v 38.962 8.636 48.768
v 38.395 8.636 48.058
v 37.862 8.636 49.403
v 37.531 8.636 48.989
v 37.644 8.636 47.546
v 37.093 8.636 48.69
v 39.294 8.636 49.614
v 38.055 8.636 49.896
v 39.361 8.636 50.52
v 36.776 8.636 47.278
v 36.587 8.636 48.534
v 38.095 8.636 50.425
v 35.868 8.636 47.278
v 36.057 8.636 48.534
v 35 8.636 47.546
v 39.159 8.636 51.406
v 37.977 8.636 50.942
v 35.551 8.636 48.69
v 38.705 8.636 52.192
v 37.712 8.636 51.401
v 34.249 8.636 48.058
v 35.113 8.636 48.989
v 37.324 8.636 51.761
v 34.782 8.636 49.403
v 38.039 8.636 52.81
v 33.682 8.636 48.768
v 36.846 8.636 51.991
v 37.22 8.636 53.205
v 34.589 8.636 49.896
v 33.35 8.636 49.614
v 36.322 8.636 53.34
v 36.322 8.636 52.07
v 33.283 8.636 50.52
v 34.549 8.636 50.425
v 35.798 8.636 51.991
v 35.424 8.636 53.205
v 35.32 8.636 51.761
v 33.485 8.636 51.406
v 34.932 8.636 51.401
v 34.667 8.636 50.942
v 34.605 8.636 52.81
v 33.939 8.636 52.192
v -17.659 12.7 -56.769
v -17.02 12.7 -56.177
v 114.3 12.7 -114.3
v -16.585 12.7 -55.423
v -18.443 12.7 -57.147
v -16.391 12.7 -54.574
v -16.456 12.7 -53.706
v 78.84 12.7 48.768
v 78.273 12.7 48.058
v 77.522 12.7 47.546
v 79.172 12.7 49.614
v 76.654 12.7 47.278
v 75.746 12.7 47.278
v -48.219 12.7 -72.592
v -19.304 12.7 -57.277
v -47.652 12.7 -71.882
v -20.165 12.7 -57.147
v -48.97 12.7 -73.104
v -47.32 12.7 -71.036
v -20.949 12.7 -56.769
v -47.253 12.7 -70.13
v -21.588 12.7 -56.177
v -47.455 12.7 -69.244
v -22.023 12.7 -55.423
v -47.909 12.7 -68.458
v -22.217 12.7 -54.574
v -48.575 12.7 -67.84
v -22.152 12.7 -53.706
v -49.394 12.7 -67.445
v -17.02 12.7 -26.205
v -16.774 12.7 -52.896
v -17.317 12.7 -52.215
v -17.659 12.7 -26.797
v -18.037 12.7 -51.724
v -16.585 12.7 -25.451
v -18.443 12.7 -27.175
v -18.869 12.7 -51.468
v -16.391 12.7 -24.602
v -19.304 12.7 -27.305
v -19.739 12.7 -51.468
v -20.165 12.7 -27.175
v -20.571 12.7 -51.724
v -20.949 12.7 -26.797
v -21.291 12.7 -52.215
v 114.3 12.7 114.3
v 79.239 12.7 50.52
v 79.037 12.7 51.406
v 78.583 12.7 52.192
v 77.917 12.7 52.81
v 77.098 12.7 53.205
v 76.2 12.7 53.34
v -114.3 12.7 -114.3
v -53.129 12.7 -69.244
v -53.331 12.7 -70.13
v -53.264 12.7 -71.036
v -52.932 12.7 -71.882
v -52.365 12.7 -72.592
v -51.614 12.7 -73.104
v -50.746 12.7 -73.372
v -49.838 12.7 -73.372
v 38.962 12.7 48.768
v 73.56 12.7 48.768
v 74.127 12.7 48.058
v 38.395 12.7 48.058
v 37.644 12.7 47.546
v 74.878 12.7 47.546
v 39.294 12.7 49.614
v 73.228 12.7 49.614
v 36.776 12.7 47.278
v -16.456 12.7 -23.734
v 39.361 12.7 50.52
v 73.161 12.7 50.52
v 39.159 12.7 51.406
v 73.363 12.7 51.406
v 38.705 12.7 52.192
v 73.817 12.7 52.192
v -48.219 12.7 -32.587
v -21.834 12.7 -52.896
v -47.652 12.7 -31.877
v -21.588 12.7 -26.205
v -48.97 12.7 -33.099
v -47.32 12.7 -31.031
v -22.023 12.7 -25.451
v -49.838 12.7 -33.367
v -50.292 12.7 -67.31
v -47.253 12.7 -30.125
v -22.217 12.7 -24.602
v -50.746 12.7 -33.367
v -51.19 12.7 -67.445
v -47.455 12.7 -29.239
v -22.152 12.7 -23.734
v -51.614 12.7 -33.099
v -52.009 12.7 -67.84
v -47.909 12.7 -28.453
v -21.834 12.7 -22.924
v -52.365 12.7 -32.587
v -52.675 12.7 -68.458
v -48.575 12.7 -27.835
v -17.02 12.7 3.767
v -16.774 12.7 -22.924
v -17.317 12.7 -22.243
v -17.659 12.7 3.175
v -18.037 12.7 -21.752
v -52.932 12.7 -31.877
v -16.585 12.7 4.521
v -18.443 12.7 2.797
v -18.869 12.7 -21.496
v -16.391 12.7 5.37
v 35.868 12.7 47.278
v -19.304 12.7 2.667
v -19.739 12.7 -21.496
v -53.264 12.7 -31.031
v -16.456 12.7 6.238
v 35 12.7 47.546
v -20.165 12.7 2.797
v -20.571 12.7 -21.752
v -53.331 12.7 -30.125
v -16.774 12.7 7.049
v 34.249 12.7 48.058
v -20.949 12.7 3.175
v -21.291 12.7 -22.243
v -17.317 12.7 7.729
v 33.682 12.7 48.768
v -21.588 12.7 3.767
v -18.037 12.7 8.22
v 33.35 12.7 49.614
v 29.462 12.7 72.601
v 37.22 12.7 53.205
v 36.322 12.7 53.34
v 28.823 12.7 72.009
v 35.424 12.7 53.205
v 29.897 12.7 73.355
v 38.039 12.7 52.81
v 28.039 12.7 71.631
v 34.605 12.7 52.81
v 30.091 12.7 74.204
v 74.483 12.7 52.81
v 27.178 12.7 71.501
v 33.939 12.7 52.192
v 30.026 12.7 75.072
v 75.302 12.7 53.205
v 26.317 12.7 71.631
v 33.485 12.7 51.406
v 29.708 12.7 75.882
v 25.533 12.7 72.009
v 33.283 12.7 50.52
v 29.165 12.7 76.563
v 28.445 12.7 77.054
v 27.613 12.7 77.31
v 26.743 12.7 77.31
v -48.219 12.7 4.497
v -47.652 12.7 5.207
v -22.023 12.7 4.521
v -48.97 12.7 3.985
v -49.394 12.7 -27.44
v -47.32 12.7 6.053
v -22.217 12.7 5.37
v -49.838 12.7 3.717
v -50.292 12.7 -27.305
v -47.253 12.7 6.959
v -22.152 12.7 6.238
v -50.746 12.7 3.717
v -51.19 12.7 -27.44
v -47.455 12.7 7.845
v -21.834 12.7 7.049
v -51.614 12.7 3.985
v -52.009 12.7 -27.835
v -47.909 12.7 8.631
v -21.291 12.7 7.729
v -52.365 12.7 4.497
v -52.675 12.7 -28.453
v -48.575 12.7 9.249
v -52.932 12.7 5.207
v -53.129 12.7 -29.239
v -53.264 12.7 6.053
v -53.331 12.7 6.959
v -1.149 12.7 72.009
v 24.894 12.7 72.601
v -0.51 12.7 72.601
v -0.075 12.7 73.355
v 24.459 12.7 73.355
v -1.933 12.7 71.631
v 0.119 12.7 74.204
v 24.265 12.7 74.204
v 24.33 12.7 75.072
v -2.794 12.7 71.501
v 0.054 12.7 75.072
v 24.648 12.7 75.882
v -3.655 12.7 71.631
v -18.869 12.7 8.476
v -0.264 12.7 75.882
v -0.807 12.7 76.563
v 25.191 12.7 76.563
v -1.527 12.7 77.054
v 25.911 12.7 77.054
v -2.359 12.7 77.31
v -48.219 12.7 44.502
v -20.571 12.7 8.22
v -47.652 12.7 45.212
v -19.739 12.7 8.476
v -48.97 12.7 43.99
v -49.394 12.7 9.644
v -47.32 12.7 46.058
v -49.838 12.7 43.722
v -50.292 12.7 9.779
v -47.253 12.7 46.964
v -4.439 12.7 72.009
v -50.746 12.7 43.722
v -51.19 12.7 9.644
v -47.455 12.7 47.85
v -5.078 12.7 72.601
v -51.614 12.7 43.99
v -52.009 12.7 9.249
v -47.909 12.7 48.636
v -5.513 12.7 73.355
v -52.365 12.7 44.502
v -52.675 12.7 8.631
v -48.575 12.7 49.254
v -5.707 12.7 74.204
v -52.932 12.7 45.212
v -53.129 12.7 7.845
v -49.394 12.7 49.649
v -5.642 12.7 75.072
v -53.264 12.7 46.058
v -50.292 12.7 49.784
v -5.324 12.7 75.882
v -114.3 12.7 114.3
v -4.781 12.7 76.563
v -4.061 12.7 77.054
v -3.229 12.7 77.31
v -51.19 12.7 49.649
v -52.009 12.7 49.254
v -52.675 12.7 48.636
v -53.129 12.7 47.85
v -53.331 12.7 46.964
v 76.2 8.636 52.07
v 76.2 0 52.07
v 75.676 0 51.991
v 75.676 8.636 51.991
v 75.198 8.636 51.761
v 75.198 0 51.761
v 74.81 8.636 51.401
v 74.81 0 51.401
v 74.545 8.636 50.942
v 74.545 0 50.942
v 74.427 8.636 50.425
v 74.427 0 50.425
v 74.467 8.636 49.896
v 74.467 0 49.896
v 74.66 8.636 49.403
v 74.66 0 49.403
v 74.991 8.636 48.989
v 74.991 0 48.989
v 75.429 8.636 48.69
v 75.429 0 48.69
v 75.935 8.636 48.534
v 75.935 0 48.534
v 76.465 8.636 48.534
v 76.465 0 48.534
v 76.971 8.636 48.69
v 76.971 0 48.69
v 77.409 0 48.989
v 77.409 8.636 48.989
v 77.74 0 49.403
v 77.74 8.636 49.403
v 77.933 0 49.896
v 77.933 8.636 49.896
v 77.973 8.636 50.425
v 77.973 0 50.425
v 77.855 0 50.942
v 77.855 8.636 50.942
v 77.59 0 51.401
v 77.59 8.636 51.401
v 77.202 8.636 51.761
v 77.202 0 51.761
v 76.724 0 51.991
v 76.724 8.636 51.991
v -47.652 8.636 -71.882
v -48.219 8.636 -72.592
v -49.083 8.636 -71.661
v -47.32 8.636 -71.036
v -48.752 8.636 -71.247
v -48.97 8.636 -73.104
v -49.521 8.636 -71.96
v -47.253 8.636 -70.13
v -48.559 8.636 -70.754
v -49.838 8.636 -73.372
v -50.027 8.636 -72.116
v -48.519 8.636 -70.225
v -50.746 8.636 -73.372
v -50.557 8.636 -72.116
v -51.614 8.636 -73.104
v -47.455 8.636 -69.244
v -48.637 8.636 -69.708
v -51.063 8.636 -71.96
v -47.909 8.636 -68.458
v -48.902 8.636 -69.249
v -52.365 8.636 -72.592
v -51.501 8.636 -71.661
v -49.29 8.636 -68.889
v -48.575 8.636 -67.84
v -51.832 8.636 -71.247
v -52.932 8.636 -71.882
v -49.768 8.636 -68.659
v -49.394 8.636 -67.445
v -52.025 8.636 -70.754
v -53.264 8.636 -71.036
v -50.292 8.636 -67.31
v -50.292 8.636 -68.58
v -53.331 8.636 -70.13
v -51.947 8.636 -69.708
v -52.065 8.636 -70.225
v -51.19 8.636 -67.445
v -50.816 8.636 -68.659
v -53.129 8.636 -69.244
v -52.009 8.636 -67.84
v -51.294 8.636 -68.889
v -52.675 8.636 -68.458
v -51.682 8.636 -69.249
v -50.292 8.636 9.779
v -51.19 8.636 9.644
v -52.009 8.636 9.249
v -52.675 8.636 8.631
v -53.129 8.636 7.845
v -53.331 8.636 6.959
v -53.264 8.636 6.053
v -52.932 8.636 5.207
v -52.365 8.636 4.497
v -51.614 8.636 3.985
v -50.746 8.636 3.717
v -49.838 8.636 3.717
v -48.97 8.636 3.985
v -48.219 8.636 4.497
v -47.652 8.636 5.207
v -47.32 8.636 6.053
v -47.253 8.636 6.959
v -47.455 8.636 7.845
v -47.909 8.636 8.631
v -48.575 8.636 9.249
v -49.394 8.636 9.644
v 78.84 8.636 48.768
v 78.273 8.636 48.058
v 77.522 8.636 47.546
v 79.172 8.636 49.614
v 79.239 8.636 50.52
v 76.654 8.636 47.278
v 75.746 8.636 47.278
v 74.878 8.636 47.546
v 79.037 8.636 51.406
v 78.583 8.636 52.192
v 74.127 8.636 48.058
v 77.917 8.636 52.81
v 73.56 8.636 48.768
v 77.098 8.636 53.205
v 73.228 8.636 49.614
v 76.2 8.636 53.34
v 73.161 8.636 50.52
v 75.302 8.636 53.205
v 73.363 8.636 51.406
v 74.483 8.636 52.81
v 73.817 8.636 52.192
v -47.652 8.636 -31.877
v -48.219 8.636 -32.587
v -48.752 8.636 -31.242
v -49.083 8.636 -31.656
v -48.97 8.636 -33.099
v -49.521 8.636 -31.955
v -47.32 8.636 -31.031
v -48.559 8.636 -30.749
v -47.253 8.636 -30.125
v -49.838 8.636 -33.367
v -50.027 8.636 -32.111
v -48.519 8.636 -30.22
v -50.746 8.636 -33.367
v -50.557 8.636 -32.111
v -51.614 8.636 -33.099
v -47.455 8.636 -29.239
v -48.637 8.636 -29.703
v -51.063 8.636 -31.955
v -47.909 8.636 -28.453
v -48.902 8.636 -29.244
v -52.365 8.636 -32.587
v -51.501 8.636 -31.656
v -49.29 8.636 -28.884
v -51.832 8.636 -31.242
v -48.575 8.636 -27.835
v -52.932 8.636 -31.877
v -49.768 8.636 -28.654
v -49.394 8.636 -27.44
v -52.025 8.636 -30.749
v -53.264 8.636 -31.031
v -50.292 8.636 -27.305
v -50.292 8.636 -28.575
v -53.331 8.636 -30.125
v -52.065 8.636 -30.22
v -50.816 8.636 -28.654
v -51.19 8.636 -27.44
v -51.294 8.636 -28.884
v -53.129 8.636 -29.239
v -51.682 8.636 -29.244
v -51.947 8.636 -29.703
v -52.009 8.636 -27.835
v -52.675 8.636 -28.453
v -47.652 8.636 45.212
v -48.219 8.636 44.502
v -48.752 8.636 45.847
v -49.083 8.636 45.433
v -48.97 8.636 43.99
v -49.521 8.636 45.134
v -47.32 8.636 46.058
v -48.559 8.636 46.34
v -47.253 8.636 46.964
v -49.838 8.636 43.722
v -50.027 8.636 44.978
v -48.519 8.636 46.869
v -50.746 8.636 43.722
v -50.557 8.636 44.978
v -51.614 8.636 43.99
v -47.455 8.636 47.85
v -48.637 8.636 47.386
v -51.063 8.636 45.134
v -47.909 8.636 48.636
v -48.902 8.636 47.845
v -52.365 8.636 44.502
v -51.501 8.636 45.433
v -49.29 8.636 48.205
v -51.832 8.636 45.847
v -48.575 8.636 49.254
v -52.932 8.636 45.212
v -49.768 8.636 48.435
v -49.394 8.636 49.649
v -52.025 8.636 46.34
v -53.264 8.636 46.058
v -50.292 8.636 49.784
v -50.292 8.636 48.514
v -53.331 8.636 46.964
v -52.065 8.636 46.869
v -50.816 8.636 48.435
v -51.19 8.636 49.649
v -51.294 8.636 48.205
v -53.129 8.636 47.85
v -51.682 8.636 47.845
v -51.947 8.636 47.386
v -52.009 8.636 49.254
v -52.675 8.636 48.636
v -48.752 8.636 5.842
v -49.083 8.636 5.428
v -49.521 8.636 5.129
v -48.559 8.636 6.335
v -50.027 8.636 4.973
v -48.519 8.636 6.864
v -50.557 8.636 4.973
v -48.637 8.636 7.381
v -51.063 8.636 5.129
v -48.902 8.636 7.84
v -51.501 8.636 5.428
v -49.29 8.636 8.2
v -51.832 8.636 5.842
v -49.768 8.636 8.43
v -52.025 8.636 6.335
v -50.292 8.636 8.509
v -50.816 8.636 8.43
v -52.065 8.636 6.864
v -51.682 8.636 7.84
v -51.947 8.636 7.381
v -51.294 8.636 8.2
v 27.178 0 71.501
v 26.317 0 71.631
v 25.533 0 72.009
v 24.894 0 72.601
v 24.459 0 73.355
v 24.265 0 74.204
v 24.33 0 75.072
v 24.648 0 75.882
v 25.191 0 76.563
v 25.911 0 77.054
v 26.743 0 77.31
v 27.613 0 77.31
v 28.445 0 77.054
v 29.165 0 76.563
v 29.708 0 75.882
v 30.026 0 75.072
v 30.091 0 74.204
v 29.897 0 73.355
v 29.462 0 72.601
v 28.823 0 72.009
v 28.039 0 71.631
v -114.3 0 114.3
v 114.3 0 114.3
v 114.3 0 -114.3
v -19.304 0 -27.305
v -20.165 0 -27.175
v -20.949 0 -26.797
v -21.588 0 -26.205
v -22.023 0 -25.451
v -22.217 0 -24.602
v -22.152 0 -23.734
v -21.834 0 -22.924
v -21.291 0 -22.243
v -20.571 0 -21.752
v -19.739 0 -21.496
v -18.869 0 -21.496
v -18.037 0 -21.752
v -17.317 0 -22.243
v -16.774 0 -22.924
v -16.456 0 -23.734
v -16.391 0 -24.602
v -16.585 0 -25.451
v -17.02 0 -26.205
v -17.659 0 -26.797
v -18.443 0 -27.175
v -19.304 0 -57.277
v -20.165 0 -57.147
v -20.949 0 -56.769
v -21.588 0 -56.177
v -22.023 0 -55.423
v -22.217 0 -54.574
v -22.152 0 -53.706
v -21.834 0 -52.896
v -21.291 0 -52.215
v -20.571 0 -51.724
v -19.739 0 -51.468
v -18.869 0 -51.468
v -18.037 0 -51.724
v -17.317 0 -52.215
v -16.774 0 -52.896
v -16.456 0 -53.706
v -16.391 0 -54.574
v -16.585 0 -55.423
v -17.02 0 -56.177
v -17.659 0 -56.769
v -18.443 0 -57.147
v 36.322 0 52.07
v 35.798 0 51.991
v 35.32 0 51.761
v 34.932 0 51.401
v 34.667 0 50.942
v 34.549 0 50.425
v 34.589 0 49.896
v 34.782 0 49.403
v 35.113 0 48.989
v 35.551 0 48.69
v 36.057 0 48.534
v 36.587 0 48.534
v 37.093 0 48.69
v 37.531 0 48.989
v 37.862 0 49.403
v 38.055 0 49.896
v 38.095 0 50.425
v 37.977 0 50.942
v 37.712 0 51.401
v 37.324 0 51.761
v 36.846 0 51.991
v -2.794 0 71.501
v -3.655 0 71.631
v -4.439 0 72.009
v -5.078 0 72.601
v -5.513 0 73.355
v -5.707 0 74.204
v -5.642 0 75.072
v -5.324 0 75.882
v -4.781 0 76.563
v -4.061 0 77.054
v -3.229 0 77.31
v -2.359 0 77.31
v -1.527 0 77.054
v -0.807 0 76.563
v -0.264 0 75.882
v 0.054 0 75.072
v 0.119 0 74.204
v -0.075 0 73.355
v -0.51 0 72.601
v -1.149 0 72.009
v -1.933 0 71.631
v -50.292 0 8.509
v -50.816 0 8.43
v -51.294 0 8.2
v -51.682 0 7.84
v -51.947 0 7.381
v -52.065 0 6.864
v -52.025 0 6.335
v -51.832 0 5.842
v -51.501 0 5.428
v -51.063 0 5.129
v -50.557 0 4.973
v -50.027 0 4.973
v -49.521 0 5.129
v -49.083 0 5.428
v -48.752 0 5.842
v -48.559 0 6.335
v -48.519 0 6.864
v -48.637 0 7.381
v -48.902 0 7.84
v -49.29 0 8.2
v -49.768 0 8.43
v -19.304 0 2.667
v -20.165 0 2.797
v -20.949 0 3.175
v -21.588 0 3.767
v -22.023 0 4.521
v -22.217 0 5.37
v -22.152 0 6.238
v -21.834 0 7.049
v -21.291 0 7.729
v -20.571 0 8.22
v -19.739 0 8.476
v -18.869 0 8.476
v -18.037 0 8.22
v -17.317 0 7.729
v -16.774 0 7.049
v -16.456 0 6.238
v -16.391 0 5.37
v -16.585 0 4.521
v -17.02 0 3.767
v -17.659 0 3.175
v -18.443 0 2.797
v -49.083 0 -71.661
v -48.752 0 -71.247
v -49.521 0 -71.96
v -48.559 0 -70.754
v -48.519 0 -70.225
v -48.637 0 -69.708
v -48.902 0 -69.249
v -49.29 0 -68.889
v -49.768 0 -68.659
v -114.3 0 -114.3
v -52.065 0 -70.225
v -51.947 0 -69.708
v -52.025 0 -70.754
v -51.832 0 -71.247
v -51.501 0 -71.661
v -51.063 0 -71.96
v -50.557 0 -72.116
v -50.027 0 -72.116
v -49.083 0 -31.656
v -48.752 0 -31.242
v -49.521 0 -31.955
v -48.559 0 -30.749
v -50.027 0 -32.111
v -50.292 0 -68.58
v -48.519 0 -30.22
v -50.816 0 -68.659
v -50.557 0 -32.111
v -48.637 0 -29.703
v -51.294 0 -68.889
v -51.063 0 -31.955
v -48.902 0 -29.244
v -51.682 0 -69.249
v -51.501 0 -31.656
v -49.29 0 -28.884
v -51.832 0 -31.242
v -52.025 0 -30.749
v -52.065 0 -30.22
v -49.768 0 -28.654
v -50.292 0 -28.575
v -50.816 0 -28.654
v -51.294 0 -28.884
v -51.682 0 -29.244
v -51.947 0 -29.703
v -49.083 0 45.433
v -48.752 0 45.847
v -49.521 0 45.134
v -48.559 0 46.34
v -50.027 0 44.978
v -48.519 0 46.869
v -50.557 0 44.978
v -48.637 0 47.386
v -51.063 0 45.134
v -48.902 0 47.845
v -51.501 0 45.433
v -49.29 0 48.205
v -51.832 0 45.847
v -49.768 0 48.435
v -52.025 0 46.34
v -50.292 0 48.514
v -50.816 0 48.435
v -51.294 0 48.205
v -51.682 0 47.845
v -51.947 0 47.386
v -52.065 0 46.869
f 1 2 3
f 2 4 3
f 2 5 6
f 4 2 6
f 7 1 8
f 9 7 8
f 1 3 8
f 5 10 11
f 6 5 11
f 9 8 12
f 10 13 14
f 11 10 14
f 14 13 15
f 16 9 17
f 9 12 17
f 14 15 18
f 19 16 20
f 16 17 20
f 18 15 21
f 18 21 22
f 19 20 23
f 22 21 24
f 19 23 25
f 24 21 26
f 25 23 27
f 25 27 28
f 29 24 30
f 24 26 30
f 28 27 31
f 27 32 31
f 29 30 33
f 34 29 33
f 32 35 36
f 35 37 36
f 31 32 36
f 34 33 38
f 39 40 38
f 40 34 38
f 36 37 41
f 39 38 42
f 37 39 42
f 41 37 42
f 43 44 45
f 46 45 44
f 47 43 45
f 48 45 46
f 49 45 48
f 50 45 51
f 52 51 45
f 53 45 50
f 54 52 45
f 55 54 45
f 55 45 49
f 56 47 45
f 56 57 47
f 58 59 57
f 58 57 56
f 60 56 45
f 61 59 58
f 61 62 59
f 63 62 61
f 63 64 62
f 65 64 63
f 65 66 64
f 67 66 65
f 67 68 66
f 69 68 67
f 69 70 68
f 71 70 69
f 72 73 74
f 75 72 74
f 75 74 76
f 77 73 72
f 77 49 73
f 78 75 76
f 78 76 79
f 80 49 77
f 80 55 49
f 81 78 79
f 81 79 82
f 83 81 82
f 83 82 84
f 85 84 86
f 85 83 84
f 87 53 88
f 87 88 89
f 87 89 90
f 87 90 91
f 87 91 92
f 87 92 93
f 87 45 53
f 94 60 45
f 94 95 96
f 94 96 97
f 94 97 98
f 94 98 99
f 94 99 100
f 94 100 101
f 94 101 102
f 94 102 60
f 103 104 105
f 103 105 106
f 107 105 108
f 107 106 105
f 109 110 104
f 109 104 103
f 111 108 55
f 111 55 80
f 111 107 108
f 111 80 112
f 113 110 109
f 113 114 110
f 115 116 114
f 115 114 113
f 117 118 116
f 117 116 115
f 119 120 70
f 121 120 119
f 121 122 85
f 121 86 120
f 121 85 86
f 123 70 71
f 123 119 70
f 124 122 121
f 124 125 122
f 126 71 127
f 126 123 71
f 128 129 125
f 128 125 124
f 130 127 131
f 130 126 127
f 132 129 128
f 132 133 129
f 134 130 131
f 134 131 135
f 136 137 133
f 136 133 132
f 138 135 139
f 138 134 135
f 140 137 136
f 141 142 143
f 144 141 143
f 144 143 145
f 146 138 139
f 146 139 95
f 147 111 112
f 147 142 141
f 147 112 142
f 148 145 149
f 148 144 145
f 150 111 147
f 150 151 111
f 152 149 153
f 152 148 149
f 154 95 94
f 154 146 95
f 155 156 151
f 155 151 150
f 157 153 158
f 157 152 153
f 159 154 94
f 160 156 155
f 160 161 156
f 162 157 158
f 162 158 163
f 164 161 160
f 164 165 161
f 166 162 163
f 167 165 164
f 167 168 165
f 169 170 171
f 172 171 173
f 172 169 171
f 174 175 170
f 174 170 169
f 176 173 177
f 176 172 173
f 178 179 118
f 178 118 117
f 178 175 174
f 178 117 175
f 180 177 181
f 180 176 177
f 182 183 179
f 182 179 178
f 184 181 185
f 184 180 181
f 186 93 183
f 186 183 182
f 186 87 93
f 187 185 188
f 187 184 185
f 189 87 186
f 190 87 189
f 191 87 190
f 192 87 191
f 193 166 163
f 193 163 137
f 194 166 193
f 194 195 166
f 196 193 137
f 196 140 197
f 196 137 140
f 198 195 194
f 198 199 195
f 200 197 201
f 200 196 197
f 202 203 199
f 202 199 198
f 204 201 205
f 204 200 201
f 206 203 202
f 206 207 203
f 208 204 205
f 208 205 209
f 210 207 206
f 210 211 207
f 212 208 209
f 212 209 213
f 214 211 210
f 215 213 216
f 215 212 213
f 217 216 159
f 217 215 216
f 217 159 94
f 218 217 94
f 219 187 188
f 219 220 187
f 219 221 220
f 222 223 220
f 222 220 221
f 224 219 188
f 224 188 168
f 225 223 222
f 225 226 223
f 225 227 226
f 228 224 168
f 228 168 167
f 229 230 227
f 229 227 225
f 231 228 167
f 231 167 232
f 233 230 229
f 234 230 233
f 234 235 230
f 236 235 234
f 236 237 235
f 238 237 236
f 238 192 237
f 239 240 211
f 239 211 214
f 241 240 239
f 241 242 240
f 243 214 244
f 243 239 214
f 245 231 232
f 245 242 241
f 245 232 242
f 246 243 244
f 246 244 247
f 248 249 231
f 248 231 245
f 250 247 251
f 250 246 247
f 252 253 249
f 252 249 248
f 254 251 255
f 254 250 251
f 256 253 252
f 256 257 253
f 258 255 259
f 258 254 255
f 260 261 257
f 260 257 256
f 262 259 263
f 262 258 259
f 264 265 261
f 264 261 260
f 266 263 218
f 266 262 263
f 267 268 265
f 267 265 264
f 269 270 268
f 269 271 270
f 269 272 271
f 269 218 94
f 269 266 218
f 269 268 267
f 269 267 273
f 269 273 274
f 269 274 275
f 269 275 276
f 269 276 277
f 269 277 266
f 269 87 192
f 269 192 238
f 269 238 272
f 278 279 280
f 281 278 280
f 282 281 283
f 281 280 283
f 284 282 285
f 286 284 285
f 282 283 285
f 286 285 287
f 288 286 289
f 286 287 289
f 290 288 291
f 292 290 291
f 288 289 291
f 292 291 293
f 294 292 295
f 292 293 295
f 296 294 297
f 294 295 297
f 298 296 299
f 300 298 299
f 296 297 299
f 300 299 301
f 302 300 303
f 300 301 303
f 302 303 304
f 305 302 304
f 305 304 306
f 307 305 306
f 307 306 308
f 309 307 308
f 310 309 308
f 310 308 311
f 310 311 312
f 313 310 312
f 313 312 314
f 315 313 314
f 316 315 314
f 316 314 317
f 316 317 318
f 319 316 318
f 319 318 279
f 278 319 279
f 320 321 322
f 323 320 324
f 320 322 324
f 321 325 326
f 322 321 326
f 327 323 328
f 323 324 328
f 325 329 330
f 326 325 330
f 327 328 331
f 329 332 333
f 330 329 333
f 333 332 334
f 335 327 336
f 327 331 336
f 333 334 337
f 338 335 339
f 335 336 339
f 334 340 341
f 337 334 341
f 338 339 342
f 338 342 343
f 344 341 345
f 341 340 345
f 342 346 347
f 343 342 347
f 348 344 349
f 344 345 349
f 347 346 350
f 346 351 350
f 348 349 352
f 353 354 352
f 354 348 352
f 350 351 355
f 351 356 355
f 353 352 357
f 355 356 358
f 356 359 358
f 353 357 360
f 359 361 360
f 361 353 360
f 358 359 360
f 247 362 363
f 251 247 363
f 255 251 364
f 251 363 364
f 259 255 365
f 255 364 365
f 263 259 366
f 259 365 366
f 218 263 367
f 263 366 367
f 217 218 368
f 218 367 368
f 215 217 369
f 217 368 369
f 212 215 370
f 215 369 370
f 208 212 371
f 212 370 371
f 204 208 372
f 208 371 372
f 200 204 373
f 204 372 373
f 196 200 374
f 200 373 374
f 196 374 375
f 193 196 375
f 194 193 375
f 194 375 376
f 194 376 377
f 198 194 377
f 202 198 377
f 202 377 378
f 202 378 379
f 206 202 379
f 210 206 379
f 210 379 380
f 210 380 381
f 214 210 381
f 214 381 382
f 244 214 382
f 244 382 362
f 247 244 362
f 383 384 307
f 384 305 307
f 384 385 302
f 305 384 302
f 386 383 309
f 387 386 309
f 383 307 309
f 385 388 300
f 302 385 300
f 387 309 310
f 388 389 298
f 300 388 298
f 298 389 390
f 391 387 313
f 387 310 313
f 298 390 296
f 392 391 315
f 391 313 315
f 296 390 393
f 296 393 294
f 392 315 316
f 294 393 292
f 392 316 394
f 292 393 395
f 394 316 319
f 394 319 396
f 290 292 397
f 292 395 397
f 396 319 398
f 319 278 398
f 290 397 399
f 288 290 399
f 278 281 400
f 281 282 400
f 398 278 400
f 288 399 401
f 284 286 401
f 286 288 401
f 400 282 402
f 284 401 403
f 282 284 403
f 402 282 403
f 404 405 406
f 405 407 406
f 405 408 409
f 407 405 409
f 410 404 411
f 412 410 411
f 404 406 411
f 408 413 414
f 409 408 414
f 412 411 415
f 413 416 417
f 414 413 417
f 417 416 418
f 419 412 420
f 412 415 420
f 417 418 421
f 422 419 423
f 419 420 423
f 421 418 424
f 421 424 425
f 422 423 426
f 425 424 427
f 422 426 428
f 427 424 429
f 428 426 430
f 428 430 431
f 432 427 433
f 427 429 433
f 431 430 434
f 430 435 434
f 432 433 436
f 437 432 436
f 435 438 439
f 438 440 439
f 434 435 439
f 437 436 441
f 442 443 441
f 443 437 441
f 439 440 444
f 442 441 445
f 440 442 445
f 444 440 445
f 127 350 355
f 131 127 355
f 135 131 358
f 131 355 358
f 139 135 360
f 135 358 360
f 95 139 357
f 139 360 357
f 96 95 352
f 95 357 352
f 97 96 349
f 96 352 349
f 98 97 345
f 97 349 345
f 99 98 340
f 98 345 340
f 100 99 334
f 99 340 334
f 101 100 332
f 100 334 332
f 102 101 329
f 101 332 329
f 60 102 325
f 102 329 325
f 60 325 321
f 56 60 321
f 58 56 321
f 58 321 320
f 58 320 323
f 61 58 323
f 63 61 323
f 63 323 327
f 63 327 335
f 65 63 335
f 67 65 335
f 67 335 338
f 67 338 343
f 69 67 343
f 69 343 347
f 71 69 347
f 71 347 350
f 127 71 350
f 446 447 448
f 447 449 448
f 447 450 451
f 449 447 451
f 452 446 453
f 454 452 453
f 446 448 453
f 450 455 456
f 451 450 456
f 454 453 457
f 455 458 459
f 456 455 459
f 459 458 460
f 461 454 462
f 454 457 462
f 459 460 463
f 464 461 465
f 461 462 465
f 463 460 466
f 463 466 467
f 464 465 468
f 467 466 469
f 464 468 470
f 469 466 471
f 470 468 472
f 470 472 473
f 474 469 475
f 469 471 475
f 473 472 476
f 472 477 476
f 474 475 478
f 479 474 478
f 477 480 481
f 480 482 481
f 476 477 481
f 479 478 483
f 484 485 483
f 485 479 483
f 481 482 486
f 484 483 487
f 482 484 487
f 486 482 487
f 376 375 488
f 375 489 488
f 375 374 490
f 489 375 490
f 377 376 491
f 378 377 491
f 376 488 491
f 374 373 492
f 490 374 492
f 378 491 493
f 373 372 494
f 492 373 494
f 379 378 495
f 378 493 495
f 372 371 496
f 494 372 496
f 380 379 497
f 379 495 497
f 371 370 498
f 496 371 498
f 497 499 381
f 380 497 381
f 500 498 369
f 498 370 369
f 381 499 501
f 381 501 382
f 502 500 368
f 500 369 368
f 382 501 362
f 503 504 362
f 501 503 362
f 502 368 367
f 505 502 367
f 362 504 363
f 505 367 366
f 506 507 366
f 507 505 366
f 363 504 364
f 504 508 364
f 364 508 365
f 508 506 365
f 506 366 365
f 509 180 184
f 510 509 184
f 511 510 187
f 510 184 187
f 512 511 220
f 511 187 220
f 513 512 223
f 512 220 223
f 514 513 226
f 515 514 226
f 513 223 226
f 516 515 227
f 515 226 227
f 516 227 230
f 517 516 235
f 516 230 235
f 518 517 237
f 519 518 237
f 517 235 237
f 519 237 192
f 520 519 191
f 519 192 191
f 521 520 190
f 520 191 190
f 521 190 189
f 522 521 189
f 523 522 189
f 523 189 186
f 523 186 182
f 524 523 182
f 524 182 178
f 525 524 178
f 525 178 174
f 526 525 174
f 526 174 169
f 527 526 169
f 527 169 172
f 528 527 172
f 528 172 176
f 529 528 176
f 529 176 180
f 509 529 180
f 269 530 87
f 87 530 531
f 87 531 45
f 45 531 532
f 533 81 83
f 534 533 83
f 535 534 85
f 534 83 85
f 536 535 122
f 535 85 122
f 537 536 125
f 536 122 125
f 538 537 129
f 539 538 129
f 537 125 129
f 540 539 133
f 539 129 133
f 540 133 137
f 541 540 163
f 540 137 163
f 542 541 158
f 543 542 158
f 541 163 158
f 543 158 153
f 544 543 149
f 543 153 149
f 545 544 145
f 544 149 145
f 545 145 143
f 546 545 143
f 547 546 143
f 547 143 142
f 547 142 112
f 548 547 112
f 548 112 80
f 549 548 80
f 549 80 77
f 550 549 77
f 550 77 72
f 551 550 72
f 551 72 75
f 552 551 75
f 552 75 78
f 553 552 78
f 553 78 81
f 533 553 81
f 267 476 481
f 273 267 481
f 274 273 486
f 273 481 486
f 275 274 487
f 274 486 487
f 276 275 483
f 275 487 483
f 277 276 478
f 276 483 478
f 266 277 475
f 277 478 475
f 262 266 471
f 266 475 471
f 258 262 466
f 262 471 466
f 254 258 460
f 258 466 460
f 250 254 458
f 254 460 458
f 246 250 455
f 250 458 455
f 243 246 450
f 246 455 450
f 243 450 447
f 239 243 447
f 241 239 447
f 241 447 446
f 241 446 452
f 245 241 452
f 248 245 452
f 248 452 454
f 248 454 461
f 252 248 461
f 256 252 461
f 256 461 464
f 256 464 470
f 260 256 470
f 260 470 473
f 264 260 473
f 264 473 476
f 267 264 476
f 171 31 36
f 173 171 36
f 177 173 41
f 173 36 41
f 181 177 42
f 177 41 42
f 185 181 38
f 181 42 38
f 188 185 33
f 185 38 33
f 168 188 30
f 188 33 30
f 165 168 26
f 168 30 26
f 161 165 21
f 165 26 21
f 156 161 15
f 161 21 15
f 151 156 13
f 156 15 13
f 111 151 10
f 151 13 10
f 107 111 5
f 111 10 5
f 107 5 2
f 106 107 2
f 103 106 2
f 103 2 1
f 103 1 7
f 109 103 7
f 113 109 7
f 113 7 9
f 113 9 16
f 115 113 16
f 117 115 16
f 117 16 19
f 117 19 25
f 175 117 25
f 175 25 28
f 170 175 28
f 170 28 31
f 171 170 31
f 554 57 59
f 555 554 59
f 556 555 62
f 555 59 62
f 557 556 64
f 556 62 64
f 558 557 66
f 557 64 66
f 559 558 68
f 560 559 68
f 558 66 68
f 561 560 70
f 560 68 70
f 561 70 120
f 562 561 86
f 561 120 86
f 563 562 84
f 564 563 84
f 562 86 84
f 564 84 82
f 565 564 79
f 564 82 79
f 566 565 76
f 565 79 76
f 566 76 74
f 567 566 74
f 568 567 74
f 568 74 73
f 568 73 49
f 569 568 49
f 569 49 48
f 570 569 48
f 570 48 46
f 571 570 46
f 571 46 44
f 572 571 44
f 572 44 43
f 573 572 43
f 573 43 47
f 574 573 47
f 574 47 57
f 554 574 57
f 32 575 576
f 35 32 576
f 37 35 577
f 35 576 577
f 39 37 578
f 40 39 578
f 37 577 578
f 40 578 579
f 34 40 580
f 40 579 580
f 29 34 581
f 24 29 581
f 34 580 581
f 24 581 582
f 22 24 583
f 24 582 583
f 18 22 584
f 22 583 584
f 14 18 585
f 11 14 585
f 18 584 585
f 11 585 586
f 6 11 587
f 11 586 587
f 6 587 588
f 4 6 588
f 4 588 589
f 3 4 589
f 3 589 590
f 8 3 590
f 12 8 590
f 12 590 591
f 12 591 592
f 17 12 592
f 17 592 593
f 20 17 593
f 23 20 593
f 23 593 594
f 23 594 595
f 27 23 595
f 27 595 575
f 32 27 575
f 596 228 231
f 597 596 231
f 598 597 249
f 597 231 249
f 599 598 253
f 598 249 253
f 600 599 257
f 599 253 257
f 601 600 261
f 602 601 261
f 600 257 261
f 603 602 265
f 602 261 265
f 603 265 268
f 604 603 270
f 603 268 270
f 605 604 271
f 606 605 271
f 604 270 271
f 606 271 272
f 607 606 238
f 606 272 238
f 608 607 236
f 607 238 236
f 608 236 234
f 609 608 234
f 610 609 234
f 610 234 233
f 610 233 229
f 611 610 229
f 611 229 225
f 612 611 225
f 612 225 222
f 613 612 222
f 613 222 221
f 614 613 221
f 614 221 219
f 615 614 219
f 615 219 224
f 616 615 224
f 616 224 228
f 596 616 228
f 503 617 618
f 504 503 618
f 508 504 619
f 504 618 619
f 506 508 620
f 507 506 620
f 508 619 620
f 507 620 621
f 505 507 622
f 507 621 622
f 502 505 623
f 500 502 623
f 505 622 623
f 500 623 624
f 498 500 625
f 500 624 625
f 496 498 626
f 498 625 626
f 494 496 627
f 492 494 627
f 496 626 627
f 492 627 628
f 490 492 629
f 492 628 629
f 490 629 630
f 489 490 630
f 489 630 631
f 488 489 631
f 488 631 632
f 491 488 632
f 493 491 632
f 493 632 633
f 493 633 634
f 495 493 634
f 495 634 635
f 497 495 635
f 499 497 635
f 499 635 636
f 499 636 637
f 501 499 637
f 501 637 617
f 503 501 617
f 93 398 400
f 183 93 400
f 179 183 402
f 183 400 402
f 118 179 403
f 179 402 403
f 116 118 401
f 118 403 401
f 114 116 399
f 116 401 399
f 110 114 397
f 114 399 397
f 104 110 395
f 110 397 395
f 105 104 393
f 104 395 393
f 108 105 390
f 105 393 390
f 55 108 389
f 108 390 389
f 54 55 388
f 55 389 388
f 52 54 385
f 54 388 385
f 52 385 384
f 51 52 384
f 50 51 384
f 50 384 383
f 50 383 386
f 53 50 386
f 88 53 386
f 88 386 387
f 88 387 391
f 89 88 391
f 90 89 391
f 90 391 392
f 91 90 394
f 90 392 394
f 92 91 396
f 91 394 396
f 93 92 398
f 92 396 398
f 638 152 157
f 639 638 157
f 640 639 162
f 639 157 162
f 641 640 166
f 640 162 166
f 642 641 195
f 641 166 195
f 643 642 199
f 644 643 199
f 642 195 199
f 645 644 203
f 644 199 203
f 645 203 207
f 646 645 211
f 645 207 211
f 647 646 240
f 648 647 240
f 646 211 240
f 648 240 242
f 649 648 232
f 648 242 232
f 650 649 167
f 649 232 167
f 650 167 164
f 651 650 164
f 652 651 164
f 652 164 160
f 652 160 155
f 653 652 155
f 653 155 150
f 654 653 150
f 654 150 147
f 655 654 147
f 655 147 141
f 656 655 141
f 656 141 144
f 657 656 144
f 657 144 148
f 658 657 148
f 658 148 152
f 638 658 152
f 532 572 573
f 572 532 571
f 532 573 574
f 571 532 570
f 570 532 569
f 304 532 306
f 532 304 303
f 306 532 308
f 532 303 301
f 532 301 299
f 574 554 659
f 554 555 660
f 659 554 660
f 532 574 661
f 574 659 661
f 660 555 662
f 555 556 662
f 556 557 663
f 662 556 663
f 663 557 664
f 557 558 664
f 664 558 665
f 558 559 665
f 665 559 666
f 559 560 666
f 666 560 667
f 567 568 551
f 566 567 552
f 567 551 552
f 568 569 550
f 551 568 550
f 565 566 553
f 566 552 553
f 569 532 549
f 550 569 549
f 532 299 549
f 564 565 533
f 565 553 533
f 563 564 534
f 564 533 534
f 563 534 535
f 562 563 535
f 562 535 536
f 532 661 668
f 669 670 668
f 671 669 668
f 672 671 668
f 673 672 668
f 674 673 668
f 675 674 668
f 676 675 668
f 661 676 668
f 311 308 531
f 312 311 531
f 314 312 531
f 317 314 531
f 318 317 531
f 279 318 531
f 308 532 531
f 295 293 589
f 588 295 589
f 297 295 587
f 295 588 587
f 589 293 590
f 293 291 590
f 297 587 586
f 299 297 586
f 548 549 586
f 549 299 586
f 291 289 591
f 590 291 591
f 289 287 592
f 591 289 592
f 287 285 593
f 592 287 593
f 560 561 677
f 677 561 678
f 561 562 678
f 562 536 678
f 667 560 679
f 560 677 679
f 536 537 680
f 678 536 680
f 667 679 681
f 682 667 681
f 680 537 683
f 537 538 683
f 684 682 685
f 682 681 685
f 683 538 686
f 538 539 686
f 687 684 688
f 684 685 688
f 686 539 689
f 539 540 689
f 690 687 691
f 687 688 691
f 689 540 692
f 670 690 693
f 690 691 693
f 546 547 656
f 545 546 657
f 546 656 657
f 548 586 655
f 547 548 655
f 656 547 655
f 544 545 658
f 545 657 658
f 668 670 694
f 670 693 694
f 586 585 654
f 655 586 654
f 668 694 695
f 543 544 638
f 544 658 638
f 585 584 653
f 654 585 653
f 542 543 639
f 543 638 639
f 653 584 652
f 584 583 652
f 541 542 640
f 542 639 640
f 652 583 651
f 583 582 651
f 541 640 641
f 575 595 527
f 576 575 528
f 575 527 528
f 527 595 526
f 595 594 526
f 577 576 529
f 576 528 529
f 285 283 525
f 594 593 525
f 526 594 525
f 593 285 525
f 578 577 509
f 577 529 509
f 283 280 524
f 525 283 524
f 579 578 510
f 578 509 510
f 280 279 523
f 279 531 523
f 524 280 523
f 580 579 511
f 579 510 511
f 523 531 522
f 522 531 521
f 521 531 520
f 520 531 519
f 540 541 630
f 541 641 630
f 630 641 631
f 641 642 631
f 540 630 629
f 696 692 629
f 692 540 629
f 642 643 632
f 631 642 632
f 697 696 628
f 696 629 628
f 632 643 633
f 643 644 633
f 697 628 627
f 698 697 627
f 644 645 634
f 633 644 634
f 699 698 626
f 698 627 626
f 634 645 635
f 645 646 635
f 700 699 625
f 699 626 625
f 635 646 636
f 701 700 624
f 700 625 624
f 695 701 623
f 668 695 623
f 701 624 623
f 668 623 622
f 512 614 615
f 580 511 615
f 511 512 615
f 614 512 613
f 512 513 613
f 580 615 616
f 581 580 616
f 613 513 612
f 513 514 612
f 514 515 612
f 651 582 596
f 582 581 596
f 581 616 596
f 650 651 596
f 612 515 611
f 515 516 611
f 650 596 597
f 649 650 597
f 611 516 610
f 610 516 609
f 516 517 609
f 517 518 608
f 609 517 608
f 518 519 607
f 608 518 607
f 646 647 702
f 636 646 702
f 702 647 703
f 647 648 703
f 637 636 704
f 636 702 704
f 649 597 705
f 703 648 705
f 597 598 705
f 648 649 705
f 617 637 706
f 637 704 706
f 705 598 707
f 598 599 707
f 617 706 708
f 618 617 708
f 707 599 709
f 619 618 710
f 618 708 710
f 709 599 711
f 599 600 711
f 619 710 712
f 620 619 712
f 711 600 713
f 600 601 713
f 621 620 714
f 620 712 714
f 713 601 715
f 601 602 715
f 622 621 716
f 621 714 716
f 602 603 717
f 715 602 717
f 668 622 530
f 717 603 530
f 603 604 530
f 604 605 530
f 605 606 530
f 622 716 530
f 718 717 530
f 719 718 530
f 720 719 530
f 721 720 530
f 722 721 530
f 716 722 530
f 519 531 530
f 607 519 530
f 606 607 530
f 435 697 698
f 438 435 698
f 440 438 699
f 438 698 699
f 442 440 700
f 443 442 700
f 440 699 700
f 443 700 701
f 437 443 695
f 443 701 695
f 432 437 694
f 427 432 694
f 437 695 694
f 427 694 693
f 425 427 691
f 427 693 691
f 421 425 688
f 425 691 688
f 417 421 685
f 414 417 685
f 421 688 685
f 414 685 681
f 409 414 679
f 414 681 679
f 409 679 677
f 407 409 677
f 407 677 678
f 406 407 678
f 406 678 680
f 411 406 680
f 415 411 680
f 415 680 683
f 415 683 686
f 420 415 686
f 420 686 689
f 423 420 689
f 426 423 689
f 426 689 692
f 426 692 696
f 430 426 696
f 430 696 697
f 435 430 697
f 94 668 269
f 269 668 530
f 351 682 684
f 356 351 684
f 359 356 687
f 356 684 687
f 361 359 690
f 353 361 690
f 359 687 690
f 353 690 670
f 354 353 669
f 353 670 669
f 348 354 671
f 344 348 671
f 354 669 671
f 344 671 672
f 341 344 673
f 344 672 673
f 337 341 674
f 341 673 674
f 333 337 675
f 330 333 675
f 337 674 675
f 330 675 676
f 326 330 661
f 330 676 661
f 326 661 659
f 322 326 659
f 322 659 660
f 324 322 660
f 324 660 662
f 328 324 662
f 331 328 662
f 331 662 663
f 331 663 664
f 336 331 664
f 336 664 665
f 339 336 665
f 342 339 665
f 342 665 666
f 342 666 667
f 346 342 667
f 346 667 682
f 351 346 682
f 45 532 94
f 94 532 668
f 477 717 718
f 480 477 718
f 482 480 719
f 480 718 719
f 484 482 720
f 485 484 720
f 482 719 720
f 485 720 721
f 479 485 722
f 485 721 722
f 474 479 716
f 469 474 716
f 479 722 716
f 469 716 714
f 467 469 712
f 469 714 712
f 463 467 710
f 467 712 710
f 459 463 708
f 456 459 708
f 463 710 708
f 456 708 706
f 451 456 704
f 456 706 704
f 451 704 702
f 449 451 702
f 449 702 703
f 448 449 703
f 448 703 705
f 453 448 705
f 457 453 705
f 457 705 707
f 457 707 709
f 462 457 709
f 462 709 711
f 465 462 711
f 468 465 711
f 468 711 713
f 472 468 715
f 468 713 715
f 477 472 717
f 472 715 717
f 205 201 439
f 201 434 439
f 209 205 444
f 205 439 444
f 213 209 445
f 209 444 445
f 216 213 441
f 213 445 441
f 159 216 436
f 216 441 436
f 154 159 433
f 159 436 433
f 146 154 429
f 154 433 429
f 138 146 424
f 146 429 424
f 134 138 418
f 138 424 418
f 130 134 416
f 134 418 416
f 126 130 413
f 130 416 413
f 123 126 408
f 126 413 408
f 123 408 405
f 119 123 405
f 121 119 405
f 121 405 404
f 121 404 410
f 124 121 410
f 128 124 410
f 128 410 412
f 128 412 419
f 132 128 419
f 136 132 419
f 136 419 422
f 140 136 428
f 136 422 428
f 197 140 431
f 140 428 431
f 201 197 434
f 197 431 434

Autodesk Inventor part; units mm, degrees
ref_plane "YZ Plane" through (0, 0, 0) normal (1, 0, 0) x (0, 1, 0)
ref_plane "XZ Plane" through (0, 0, 0) normal (0, 1, 0) x (-1, 0, 0)
ref_plane "XY Plane" through (0, 0, 0) normal (0, 0, 1) x (1, 0, 0)
sketch "Sketch1" plane through (0, 0, 0) normal (0, 1, 0) x (-1, 0, 0)
  line L0 (114.3, 114.3) -> (-114.3, 114.3)
  line L1 (-114.3, 114.3) -> (-114.3, -114.3)
  line L2 (-114.3, -114.3) -> (114.3, -114.3)
  line L3 (114.3, -114.3) -> (114.3, 114.3)
  point P0 (0, 0)
  dimension "d0" = 228.6
  dimension "d1" = 228.6
extrude "Extrusion1" add sketch "Sketch1" along normal blind 12.7
sketch "Sketch2" plane through (0, 12.7, 0) normal (0, -1, 0) x (1, 0, 0)
  line L0 (114.3, -114.3) -> (-114.3, -114.3) projected
  line L1 (-114.3, -114.3) -> (-50.292, -114.3)
  line L2 (-50.292, -114.3) -> (-50.292, -70.358)
  line L3 (-50.292, -70.358) -> (-50.292, -30.353)
  line L4 (-50.292, -30.353) -> (-50.292, 6.731)
  line L5 (-50.292, 6.731) -> (-50.292, 46.736)
  point P0 (0, 0)
  dimension "d4" = 64.008
  dimension "d5" = 43.942
  dimension "d6" = 40.005
  dimension "d7" = 37.084
  dimension "d8" = 40.005
hole "Hole1" at (-50.292, 12.7, 46.736) at (-50.292, 12.7, 6.731) at (-50.292, 12.7, -30.353) at (-50.292, 12.7, -70.358) direction (0, -1, 0) diameter 3.556 depth 25.4 counterbore diameter 6.096 counterbore depth 4.064
sketch "Sketch3" plane through (0, 0, 0) normal (0, -1, 0) x (1, 0, 0)
  line L0 (-114.3, -114.3) -> (-19.304, -114.3)
  line L1 (114.3, -114.3) -> (-114.3, -114.3) projected
  line L2 (-19.304, -114.3) -> (-19.304, -54.356)
  line L3 (-19.304, -54.356) -> (-19.304, -24.384)
  line L4 (-19.304, -24.384) -> (-19.304, 5.588)
  line L5 (114.3, 114.3) -> (63.5, 114.3)
  line L6 (-114.3, 114.3) -> (114.3, 114.3) projected
  line L7 (63.5, 114.3) -> (63.5, 74.422)
  line L8 (63.5, 74.422) -> (33.528, 74.422)
  line L9 (63.5, 114.3) -> (63.5, 74.422)
  line L10 (63.5, 74.422) -> (33.528, 74.422)
  line L11 (33.528, 74.422) -> (27.178, 74.422)
  line L12 (27.178, 74.422) -> (-2.794, 74.422)
  point P0 (0, 0)
  dimension "d16" = 94.996
  dimension "d17" = 59.944
  dimension "d18" = 29.972
  dimension "d19" = 29.972
  dimension "d20" = 50.8
  dimension "d21" = 39.878
  dimension "d22" = 29.972
  dimension "d23" = 39.878
  dimension "d24" = 6.35
  dimension "d25" = 29.972
hole "Hole2" at (-2.794, 0, 74.422) at (27.178, 0, 74.422) at (-19.304, 0, 5.588) at (-19.304, 0, -24.384) at (-19.304, 0, -54.356) direction (0, 1, 0) diameter 5.842 depth 25.4
sketch "Sketch4" plane through (0, 12.7, 0) normal (0, 1, 0) x (1, 0, 0)
  line L0 (114.3, -114.3) -> (76.2, -114.3)
  line L1 (-114.3, -114.3) -> (114.3, -114.3) projected
  line L2 (76.2, -114.3) -> (76.2, -50.292)
  line L3 (76.2, -50.292) -> (36.322, -50.292)
  point P0 (0, 0)
  dimension "d33" = 38.1
  dimension "d34" = 64.008
  dimension "d35" = 39.878
hole "Hole3" at (76.2, 12.7, 50.292) at (36.322, 12.7, 50.292) direction (0, -1, 0) diameter 3.556 depth 25.4 counterbore diameter 6.096 counterbore depth 4.064
sketch "Sketch5" plane through (0, 12.7, 0) normal (0, 1, 0) x (1, 0, 0)
  line L0 (114.3, 114.3) -> (-114.3, 114.3) projected
  line L1 (-114.3, 114.3) -> (-104.14, 114.3)
  line L2 (-104.14, 114.3) -> (-114.3, 114.3)
  line L3 (-104.14, 114.3) -> (-104.14, 50.8)
  line L4 (-104.14, 50.8) -> (-104.14, -12.7)
  line L5 (-104.14, -12.7) -> (-104.14, -76.2)
  line L6 (-114.3, 114.3) -> (-114.3, 104.14)
  line L7 (-114.3, 114.3) -> (-114.3, -114.3) projected
  line L8 (-114.3, 104.14) -> (-50.8, 104.14)
  line L9 (-50.8, 104.14) -> (12.7, 104.14)
  line L10 (12.7, 104.14) -> (76.2, 104.14)
  line L11 (-114.3, -114.3) -> (114.3, -114.3) projected
  line L12 (114.3, -114.3) -> (114.3, -104.14)
  line L13 (114.3, -114.3) -> (114.3, 114.3) projected
  line L14 (114.3, -104.14) -> (50.8, -104.14)
  line L15 (50.8, -104.14) -> (-12.7, -104.14)
  line L16 (-12.7, -104.14) -> (-76.2, -104.14)
  line L17 (114.3, -114.3) -> (104.14, -114.3)
  line L18 (104.14, -114.3) -> (104.14, -50.8)
  line L19 (104.14, -50.8) -> (104.14, 12.7)
  line L20 (104.14, 12.7) -> (104.14, 76.2)
  point P0 (0, 0)
  dimension "d43" = 10.16
  dimension "d44" = 63.5
  dimension "d45" = 63.5
  dimension "d46" = 63.5
  dimension "d47" = 10.16
  dimension "d48" = 63.5
  dimension "d49" = 90
  dimension "d50" = 63.5
  dimension "d51" = 63.5
  dimension "d52" = 10.16
  dimension "d53" = 63.5
  dimension "d54" = 63.5
  dimension "d55" = 63.5
  dimension "d56" = 10.16
  dimension "d57" = 63.5
  dimension "d58" = 63.5
  dimension "d59" = 63.5
hole "Hole4" [suppressed]
properties part number "sheetmetalbottom"
